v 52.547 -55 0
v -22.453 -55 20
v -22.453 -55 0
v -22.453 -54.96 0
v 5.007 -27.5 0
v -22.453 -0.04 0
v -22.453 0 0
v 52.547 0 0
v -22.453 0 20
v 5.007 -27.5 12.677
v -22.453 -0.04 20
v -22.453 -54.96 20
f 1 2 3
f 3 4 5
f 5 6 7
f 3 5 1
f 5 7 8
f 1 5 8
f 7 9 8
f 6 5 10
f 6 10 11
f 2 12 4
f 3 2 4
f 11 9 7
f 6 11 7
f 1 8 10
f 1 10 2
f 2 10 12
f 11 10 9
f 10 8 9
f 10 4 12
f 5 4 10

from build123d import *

# Parameters (mm, degrees)
F1_DEPTH = 55
F3_DEPTH = 20


with BuildPart() as f1:
    # F0 (on Front) → F1 (new body)
    with BuildSketch(Plane.XZ):
        Polygon((-22.45298, 20), (-22.45298, 0), (52.54702, 0), align=None)
    extrude(amount=F1_DEPTH)

    # F2 (on Top) → F3 (cut)
    with BuildSketch(Plane.XY):
        Polygon((-22.493402, 0), (-22.493402, -55), (5.006598, -27.5), align=None)
    extrude(amount=F3_DEPTH, mode=Mode.SUBTRACT)


solid = f1.part
